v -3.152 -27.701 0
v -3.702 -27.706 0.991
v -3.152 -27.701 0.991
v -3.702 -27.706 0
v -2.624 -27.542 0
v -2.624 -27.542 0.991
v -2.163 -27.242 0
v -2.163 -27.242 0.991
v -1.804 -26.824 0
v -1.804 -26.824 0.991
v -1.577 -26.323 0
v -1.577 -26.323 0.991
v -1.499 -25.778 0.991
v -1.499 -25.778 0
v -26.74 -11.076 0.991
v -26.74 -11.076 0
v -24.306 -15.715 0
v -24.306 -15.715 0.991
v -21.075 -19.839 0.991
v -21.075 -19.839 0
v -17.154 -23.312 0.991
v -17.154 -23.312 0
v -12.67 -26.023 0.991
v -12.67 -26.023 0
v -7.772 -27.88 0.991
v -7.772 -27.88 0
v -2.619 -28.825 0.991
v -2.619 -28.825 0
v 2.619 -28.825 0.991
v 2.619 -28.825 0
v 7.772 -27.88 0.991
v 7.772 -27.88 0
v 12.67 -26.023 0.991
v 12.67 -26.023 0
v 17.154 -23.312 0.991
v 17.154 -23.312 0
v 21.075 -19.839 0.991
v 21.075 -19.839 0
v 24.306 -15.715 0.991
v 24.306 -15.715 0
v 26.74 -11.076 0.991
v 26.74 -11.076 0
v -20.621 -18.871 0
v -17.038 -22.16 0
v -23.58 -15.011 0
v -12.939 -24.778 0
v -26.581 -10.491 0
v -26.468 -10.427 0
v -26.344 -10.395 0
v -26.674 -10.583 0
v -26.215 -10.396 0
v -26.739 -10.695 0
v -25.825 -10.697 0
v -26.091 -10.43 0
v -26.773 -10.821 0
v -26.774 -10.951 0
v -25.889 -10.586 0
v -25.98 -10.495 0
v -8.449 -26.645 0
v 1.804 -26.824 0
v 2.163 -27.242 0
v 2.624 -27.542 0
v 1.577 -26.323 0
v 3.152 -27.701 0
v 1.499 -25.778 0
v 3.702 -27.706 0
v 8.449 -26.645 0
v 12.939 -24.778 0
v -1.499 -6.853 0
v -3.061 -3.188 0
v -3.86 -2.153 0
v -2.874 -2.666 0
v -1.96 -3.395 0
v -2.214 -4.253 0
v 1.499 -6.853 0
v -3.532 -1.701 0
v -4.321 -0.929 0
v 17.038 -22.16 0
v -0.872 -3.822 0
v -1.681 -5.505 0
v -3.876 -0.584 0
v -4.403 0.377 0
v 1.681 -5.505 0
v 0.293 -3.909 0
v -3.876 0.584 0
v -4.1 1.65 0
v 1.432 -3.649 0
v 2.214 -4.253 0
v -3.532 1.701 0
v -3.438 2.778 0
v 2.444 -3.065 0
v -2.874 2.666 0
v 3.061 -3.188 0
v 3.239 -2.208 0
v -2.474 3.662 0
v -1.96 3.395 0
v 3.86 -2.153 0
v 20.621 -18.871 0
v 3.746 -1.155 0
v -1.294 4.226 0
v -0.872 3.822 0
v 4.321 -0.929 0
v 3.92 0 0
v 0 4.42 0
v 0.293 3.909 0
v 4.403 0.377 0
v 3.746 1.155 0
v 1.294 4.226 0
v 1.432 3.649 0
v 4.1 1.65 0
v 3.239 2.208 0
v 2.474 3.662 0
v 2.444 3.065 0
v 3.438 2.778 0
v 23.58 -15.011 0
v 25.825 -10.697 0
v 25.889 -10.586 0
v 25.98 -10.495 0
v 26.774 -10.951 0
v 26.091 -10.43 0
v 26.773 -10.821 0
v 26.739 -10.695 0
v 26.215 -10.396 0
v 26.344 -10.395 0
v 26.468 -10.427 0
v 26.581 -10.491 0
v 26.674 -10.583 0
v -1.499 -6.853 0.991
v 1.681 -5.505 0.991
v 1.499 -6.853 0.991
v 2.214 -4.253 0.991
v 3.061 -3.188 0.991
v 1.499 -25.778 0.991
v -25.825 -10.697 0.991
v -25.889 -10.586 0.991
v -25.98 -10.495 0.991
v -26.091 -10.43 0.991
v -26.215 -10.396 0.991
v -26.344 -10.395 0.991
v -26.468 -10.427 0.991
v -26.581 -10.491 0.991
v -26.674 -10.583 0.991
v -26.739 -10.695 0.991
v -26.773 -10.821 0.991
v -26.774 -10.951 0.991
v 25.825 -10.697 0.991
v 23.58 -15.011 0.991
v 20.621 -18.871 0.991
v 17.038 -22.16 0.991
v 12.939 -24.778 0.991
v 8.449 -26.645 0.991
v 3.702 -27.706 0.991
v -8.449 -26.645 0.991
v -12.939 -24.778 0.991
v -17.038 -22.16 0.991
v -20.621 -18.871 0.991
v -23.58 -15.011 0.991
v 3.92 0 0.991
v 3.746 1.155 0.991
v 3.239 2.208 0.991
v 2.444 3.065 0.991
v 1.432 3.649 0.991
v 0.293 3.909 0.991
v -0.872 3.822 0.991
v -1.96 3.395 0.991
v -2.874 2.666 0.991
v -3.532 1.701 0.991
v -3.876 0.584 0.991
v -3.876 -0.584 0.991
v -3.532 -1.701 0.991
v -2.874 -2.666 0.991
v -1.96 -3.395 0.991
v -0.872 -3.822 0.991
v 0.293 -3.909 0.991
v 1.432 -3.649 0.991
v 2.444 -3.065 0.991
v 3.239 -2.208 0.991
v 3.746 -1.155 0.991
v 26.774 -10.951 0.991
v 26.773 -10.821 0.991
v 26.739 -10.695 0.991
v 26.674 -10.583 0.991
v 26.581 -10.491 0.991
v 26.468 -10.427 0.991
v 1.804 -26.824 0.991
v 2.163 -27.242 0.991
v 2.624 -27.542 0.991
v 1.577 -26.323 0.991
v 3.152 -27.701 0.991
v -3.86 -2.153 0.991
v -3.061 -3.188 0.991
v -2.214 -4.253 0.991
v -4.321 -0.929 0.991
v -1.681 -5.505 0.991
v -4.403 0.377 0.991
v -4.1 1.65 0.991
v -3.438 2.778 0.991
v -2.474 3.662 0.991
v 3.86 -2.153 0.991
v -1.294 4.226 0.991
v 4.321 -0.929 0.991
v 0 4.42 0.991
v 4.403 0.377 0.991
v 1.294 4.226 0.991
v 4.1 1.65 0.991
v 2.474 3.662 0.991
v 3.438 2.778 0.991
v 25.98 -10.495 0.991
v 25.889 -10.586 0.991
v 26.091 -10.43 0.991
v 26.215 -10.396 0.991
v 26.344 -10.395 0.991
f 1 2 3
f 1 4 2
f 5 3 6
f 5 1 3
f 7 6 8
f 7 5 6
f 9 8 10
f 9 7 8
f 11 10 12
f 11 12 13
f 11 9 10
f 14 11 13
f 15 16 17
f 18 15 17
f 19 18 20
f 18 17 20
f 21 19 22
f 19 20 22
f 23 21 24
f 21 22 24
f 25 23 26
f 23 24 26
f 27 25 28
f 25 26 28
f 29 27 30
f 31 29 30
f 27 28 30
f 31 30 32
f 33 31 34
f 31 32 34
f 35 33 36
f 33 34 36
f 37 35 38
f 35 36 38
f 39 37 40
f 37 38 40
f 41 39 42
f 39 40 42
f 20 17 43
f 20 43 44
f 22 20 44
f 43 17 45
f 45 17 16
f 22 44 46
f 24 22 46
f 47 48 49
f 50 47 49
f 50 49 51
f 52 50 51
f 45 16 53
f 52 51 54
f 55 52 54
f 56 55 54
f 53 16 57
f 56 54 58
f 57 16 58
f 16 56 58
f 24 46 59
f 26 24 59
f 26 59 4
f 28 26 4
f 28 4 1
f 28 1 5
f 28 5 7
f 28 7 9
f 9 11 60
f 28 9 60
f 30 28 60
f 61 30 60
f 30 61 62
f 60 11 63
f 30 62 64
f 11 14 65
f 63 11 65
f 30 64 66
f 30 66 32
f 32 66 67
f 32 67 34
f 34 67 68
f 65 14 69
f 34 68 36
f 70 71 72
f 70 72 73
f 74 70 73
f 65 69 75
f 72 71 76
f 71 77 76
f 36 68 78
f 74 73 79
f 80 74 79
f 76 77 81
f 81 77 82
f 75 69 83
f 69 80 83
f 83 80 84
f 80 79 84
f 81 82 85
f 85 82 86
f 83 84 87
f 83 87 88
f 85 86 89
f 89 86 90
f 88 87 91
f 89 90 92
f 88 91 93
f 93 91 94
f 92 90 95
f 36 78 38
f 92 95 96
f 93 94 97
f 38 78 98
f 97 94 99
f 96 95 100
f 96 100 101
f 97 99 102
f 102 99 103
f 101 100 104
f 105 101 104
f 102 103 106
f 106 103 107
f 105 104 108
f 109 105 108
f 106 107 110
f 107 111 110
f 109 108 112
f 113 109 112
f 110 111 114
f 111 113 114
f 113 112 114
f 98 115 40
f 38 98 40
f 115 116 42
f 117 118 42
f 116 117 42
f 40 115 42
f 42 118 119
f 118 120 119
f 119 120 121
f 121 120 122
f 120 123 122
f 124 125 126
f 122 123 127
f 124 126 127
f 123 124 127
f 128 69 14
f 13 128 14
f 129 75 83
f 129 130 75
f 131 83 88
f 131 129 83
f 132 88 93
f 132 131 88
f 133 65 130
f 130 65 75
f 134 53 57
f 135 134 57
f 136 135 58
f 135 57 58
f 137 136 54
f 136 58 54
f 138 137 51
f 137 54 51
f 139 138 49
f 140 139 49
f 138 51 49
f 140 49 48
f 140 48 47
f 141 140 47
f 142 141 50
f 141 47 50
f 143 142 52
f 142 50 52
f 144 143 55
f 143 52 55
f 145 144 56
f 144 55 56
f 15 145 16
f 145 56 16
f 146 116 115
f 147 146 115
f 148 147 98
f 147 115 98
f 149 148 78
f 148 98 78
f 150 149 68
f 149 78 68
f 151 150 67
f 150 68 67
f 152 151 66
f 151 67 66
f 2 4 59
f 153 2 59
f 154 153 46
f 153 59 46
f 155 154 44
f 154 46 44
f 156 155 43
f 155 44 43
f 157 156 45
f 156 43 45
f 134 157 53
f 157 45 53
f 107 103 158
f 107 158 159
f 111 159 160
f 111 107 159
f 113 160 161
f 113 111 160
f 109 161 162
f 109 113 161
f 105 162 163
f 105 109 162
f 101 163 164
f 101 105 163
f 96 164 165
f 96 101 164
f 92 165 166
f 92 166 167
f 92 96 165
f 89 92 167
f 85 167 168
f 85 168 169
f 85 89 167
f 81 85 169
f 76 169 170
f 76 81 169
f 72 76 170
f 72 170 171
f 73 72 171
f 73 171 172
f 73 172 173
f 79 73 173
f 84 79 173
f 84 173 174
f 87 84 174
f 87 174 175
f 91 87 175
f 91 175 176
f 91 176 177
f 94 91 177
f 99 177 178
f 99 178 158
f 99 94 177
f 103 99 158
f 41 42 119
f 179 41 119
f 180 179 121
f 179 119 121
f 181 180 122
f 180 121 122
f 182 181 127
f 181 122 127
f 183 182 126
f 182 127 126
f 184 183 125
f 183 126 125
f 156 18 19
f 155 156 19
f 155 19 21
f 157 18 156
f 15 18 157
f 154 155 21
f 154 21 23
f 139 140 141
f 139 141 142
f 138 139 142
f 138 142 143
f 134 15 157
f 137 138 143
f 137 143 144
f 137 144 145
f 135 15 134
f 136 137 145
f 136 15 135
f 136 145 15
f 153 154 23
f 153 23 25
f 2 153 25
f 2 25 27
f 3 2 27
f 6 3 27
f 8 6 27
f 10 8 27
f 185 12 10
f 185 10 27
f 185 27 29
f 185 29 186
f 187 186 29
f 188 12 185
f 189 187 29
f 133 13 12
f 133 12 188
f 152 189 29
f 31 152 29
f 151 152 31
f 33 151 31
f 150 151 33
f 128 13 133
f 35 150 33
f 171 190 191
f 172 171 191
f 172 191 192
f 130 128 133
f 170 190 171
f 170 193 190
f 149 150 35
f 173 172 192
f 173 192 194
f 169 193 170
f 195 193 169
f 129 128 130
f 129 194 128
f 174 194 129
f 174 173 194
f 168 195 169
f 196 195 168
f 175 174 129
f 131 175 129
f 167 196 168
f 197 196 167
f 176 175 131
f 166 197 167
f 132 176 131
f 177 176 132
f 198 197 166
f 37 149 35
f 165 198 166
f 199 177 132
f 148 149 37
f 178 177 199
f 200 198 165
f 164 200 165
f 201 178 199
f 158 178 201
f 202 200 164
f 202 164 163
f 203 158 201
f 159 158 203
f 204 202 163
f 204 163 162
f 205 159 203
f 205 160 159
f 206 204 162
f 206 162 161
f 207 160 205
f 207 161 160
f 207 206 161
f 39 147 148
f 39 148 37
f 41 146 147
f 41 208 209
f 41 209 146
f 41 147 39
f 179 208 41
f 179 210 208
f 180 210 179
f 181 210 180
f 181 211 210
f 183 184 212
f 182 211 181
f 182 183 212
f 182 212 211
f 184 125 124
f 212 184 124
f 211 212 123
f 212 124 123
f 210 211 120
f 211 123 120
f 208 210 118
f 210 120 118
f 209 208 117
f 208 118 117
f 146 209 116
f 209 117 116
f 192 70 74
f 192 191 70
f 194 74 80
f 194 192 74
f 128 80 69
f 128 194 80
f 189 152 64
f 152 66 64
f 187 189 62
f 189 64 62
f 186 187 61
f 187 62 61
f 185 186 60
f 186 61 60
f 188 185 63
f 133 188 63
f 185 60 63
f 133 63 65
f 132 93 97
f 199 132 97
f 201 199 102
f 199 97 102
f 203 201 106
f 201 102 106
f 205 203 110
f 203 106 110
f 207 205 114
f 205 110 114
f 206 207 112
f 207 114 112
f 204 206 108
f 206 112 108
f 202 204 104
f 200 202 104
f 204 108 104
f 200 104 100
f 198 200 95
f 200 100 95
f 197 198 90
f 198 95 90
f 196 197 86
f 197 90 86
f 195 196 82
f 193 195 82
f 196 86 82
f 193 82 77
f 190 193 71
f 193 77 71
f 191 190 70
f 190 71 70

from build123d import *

# Parameters (mm, degrees)
F0_R     = 3.92
F2_DEPTH = 0.9906
F3_R     = 5.08
F4_DEPTH = 0.9906
F5_R     = 1.9460346085


with BuildPart() as f2:
    # F0 (on Top) → F2 (new body)
    with BuildSketch(Plane.XY):
        with BuildLine():
            Line((1.4986, -28.459371031), (1.4986, -4.157771302))
            ThreePointArc((1.4986, -4.157771302), (0, 4.4196), (-1.4986, -4.157771302))
            Line((-1.4986, -4.157771302), (-1.4986, -28.459371031))
            Line((-1.4986, -28.459371031), (1.4986, -28.459371031))
        make_face()
        Circle(F0_R, mode=Mode.SUBTRACT)
    extrude(amount=F2_DEPTH)

    # F3
    f3_edges = [f2.edges().sort_by_distance(p)[0] for p in [
        (1.4986, -4.157771, 0.4953),
        (-1.4986, -4.157771, 0.4953),
    ]]
    fillet(f3_edges, radius=F3_R)

    # F1 (on Top) → F4 (join)
    with BuildSketch(Plane.XY):
        with BuildLine():
            ThreePointArc((26.7401224733, -11.076121388), (26.7392931104, -10.6950451816), (26.4680773128, -10.4273480505))
            ThreePointArc((26.4680773128, -10.4273480505), (26.0909918386, -10.4298101144), (25.8249274084, -10.6970351799))
            ThreePointArc((25.8249274084, -10.6970351799), (0, -27.9527), (-25.8249274084, -10.6970351799))
            ThreePointArc((-25.8249274084, -10.6970351799), (-26.0909918386, -10.4298101144), (-26.4680773128, -10.4273480505))
            ThreePointArc((-26.4680773128, -10.4273480505), (-26.7392931104, -10.6950451816), (-26.7401224733, -11.076121388))
            ThreePointArc((-26.7401224733, -11.076121388), (0, -28.9433), (26.7401224733, -11.076121388))
        make_face()
    extrude(amount=F4_DEPTH)

    # F5
    f5_edges = [f2.edges().sort_by_distance(p)[0] for p in [
        (1.4986, -27.9125, 0.4953),
        (-1.4986, -27.9125, 0.4953),
    ]]
    fillet(f5_edges, radius=F5_R)


solid = f2.part
